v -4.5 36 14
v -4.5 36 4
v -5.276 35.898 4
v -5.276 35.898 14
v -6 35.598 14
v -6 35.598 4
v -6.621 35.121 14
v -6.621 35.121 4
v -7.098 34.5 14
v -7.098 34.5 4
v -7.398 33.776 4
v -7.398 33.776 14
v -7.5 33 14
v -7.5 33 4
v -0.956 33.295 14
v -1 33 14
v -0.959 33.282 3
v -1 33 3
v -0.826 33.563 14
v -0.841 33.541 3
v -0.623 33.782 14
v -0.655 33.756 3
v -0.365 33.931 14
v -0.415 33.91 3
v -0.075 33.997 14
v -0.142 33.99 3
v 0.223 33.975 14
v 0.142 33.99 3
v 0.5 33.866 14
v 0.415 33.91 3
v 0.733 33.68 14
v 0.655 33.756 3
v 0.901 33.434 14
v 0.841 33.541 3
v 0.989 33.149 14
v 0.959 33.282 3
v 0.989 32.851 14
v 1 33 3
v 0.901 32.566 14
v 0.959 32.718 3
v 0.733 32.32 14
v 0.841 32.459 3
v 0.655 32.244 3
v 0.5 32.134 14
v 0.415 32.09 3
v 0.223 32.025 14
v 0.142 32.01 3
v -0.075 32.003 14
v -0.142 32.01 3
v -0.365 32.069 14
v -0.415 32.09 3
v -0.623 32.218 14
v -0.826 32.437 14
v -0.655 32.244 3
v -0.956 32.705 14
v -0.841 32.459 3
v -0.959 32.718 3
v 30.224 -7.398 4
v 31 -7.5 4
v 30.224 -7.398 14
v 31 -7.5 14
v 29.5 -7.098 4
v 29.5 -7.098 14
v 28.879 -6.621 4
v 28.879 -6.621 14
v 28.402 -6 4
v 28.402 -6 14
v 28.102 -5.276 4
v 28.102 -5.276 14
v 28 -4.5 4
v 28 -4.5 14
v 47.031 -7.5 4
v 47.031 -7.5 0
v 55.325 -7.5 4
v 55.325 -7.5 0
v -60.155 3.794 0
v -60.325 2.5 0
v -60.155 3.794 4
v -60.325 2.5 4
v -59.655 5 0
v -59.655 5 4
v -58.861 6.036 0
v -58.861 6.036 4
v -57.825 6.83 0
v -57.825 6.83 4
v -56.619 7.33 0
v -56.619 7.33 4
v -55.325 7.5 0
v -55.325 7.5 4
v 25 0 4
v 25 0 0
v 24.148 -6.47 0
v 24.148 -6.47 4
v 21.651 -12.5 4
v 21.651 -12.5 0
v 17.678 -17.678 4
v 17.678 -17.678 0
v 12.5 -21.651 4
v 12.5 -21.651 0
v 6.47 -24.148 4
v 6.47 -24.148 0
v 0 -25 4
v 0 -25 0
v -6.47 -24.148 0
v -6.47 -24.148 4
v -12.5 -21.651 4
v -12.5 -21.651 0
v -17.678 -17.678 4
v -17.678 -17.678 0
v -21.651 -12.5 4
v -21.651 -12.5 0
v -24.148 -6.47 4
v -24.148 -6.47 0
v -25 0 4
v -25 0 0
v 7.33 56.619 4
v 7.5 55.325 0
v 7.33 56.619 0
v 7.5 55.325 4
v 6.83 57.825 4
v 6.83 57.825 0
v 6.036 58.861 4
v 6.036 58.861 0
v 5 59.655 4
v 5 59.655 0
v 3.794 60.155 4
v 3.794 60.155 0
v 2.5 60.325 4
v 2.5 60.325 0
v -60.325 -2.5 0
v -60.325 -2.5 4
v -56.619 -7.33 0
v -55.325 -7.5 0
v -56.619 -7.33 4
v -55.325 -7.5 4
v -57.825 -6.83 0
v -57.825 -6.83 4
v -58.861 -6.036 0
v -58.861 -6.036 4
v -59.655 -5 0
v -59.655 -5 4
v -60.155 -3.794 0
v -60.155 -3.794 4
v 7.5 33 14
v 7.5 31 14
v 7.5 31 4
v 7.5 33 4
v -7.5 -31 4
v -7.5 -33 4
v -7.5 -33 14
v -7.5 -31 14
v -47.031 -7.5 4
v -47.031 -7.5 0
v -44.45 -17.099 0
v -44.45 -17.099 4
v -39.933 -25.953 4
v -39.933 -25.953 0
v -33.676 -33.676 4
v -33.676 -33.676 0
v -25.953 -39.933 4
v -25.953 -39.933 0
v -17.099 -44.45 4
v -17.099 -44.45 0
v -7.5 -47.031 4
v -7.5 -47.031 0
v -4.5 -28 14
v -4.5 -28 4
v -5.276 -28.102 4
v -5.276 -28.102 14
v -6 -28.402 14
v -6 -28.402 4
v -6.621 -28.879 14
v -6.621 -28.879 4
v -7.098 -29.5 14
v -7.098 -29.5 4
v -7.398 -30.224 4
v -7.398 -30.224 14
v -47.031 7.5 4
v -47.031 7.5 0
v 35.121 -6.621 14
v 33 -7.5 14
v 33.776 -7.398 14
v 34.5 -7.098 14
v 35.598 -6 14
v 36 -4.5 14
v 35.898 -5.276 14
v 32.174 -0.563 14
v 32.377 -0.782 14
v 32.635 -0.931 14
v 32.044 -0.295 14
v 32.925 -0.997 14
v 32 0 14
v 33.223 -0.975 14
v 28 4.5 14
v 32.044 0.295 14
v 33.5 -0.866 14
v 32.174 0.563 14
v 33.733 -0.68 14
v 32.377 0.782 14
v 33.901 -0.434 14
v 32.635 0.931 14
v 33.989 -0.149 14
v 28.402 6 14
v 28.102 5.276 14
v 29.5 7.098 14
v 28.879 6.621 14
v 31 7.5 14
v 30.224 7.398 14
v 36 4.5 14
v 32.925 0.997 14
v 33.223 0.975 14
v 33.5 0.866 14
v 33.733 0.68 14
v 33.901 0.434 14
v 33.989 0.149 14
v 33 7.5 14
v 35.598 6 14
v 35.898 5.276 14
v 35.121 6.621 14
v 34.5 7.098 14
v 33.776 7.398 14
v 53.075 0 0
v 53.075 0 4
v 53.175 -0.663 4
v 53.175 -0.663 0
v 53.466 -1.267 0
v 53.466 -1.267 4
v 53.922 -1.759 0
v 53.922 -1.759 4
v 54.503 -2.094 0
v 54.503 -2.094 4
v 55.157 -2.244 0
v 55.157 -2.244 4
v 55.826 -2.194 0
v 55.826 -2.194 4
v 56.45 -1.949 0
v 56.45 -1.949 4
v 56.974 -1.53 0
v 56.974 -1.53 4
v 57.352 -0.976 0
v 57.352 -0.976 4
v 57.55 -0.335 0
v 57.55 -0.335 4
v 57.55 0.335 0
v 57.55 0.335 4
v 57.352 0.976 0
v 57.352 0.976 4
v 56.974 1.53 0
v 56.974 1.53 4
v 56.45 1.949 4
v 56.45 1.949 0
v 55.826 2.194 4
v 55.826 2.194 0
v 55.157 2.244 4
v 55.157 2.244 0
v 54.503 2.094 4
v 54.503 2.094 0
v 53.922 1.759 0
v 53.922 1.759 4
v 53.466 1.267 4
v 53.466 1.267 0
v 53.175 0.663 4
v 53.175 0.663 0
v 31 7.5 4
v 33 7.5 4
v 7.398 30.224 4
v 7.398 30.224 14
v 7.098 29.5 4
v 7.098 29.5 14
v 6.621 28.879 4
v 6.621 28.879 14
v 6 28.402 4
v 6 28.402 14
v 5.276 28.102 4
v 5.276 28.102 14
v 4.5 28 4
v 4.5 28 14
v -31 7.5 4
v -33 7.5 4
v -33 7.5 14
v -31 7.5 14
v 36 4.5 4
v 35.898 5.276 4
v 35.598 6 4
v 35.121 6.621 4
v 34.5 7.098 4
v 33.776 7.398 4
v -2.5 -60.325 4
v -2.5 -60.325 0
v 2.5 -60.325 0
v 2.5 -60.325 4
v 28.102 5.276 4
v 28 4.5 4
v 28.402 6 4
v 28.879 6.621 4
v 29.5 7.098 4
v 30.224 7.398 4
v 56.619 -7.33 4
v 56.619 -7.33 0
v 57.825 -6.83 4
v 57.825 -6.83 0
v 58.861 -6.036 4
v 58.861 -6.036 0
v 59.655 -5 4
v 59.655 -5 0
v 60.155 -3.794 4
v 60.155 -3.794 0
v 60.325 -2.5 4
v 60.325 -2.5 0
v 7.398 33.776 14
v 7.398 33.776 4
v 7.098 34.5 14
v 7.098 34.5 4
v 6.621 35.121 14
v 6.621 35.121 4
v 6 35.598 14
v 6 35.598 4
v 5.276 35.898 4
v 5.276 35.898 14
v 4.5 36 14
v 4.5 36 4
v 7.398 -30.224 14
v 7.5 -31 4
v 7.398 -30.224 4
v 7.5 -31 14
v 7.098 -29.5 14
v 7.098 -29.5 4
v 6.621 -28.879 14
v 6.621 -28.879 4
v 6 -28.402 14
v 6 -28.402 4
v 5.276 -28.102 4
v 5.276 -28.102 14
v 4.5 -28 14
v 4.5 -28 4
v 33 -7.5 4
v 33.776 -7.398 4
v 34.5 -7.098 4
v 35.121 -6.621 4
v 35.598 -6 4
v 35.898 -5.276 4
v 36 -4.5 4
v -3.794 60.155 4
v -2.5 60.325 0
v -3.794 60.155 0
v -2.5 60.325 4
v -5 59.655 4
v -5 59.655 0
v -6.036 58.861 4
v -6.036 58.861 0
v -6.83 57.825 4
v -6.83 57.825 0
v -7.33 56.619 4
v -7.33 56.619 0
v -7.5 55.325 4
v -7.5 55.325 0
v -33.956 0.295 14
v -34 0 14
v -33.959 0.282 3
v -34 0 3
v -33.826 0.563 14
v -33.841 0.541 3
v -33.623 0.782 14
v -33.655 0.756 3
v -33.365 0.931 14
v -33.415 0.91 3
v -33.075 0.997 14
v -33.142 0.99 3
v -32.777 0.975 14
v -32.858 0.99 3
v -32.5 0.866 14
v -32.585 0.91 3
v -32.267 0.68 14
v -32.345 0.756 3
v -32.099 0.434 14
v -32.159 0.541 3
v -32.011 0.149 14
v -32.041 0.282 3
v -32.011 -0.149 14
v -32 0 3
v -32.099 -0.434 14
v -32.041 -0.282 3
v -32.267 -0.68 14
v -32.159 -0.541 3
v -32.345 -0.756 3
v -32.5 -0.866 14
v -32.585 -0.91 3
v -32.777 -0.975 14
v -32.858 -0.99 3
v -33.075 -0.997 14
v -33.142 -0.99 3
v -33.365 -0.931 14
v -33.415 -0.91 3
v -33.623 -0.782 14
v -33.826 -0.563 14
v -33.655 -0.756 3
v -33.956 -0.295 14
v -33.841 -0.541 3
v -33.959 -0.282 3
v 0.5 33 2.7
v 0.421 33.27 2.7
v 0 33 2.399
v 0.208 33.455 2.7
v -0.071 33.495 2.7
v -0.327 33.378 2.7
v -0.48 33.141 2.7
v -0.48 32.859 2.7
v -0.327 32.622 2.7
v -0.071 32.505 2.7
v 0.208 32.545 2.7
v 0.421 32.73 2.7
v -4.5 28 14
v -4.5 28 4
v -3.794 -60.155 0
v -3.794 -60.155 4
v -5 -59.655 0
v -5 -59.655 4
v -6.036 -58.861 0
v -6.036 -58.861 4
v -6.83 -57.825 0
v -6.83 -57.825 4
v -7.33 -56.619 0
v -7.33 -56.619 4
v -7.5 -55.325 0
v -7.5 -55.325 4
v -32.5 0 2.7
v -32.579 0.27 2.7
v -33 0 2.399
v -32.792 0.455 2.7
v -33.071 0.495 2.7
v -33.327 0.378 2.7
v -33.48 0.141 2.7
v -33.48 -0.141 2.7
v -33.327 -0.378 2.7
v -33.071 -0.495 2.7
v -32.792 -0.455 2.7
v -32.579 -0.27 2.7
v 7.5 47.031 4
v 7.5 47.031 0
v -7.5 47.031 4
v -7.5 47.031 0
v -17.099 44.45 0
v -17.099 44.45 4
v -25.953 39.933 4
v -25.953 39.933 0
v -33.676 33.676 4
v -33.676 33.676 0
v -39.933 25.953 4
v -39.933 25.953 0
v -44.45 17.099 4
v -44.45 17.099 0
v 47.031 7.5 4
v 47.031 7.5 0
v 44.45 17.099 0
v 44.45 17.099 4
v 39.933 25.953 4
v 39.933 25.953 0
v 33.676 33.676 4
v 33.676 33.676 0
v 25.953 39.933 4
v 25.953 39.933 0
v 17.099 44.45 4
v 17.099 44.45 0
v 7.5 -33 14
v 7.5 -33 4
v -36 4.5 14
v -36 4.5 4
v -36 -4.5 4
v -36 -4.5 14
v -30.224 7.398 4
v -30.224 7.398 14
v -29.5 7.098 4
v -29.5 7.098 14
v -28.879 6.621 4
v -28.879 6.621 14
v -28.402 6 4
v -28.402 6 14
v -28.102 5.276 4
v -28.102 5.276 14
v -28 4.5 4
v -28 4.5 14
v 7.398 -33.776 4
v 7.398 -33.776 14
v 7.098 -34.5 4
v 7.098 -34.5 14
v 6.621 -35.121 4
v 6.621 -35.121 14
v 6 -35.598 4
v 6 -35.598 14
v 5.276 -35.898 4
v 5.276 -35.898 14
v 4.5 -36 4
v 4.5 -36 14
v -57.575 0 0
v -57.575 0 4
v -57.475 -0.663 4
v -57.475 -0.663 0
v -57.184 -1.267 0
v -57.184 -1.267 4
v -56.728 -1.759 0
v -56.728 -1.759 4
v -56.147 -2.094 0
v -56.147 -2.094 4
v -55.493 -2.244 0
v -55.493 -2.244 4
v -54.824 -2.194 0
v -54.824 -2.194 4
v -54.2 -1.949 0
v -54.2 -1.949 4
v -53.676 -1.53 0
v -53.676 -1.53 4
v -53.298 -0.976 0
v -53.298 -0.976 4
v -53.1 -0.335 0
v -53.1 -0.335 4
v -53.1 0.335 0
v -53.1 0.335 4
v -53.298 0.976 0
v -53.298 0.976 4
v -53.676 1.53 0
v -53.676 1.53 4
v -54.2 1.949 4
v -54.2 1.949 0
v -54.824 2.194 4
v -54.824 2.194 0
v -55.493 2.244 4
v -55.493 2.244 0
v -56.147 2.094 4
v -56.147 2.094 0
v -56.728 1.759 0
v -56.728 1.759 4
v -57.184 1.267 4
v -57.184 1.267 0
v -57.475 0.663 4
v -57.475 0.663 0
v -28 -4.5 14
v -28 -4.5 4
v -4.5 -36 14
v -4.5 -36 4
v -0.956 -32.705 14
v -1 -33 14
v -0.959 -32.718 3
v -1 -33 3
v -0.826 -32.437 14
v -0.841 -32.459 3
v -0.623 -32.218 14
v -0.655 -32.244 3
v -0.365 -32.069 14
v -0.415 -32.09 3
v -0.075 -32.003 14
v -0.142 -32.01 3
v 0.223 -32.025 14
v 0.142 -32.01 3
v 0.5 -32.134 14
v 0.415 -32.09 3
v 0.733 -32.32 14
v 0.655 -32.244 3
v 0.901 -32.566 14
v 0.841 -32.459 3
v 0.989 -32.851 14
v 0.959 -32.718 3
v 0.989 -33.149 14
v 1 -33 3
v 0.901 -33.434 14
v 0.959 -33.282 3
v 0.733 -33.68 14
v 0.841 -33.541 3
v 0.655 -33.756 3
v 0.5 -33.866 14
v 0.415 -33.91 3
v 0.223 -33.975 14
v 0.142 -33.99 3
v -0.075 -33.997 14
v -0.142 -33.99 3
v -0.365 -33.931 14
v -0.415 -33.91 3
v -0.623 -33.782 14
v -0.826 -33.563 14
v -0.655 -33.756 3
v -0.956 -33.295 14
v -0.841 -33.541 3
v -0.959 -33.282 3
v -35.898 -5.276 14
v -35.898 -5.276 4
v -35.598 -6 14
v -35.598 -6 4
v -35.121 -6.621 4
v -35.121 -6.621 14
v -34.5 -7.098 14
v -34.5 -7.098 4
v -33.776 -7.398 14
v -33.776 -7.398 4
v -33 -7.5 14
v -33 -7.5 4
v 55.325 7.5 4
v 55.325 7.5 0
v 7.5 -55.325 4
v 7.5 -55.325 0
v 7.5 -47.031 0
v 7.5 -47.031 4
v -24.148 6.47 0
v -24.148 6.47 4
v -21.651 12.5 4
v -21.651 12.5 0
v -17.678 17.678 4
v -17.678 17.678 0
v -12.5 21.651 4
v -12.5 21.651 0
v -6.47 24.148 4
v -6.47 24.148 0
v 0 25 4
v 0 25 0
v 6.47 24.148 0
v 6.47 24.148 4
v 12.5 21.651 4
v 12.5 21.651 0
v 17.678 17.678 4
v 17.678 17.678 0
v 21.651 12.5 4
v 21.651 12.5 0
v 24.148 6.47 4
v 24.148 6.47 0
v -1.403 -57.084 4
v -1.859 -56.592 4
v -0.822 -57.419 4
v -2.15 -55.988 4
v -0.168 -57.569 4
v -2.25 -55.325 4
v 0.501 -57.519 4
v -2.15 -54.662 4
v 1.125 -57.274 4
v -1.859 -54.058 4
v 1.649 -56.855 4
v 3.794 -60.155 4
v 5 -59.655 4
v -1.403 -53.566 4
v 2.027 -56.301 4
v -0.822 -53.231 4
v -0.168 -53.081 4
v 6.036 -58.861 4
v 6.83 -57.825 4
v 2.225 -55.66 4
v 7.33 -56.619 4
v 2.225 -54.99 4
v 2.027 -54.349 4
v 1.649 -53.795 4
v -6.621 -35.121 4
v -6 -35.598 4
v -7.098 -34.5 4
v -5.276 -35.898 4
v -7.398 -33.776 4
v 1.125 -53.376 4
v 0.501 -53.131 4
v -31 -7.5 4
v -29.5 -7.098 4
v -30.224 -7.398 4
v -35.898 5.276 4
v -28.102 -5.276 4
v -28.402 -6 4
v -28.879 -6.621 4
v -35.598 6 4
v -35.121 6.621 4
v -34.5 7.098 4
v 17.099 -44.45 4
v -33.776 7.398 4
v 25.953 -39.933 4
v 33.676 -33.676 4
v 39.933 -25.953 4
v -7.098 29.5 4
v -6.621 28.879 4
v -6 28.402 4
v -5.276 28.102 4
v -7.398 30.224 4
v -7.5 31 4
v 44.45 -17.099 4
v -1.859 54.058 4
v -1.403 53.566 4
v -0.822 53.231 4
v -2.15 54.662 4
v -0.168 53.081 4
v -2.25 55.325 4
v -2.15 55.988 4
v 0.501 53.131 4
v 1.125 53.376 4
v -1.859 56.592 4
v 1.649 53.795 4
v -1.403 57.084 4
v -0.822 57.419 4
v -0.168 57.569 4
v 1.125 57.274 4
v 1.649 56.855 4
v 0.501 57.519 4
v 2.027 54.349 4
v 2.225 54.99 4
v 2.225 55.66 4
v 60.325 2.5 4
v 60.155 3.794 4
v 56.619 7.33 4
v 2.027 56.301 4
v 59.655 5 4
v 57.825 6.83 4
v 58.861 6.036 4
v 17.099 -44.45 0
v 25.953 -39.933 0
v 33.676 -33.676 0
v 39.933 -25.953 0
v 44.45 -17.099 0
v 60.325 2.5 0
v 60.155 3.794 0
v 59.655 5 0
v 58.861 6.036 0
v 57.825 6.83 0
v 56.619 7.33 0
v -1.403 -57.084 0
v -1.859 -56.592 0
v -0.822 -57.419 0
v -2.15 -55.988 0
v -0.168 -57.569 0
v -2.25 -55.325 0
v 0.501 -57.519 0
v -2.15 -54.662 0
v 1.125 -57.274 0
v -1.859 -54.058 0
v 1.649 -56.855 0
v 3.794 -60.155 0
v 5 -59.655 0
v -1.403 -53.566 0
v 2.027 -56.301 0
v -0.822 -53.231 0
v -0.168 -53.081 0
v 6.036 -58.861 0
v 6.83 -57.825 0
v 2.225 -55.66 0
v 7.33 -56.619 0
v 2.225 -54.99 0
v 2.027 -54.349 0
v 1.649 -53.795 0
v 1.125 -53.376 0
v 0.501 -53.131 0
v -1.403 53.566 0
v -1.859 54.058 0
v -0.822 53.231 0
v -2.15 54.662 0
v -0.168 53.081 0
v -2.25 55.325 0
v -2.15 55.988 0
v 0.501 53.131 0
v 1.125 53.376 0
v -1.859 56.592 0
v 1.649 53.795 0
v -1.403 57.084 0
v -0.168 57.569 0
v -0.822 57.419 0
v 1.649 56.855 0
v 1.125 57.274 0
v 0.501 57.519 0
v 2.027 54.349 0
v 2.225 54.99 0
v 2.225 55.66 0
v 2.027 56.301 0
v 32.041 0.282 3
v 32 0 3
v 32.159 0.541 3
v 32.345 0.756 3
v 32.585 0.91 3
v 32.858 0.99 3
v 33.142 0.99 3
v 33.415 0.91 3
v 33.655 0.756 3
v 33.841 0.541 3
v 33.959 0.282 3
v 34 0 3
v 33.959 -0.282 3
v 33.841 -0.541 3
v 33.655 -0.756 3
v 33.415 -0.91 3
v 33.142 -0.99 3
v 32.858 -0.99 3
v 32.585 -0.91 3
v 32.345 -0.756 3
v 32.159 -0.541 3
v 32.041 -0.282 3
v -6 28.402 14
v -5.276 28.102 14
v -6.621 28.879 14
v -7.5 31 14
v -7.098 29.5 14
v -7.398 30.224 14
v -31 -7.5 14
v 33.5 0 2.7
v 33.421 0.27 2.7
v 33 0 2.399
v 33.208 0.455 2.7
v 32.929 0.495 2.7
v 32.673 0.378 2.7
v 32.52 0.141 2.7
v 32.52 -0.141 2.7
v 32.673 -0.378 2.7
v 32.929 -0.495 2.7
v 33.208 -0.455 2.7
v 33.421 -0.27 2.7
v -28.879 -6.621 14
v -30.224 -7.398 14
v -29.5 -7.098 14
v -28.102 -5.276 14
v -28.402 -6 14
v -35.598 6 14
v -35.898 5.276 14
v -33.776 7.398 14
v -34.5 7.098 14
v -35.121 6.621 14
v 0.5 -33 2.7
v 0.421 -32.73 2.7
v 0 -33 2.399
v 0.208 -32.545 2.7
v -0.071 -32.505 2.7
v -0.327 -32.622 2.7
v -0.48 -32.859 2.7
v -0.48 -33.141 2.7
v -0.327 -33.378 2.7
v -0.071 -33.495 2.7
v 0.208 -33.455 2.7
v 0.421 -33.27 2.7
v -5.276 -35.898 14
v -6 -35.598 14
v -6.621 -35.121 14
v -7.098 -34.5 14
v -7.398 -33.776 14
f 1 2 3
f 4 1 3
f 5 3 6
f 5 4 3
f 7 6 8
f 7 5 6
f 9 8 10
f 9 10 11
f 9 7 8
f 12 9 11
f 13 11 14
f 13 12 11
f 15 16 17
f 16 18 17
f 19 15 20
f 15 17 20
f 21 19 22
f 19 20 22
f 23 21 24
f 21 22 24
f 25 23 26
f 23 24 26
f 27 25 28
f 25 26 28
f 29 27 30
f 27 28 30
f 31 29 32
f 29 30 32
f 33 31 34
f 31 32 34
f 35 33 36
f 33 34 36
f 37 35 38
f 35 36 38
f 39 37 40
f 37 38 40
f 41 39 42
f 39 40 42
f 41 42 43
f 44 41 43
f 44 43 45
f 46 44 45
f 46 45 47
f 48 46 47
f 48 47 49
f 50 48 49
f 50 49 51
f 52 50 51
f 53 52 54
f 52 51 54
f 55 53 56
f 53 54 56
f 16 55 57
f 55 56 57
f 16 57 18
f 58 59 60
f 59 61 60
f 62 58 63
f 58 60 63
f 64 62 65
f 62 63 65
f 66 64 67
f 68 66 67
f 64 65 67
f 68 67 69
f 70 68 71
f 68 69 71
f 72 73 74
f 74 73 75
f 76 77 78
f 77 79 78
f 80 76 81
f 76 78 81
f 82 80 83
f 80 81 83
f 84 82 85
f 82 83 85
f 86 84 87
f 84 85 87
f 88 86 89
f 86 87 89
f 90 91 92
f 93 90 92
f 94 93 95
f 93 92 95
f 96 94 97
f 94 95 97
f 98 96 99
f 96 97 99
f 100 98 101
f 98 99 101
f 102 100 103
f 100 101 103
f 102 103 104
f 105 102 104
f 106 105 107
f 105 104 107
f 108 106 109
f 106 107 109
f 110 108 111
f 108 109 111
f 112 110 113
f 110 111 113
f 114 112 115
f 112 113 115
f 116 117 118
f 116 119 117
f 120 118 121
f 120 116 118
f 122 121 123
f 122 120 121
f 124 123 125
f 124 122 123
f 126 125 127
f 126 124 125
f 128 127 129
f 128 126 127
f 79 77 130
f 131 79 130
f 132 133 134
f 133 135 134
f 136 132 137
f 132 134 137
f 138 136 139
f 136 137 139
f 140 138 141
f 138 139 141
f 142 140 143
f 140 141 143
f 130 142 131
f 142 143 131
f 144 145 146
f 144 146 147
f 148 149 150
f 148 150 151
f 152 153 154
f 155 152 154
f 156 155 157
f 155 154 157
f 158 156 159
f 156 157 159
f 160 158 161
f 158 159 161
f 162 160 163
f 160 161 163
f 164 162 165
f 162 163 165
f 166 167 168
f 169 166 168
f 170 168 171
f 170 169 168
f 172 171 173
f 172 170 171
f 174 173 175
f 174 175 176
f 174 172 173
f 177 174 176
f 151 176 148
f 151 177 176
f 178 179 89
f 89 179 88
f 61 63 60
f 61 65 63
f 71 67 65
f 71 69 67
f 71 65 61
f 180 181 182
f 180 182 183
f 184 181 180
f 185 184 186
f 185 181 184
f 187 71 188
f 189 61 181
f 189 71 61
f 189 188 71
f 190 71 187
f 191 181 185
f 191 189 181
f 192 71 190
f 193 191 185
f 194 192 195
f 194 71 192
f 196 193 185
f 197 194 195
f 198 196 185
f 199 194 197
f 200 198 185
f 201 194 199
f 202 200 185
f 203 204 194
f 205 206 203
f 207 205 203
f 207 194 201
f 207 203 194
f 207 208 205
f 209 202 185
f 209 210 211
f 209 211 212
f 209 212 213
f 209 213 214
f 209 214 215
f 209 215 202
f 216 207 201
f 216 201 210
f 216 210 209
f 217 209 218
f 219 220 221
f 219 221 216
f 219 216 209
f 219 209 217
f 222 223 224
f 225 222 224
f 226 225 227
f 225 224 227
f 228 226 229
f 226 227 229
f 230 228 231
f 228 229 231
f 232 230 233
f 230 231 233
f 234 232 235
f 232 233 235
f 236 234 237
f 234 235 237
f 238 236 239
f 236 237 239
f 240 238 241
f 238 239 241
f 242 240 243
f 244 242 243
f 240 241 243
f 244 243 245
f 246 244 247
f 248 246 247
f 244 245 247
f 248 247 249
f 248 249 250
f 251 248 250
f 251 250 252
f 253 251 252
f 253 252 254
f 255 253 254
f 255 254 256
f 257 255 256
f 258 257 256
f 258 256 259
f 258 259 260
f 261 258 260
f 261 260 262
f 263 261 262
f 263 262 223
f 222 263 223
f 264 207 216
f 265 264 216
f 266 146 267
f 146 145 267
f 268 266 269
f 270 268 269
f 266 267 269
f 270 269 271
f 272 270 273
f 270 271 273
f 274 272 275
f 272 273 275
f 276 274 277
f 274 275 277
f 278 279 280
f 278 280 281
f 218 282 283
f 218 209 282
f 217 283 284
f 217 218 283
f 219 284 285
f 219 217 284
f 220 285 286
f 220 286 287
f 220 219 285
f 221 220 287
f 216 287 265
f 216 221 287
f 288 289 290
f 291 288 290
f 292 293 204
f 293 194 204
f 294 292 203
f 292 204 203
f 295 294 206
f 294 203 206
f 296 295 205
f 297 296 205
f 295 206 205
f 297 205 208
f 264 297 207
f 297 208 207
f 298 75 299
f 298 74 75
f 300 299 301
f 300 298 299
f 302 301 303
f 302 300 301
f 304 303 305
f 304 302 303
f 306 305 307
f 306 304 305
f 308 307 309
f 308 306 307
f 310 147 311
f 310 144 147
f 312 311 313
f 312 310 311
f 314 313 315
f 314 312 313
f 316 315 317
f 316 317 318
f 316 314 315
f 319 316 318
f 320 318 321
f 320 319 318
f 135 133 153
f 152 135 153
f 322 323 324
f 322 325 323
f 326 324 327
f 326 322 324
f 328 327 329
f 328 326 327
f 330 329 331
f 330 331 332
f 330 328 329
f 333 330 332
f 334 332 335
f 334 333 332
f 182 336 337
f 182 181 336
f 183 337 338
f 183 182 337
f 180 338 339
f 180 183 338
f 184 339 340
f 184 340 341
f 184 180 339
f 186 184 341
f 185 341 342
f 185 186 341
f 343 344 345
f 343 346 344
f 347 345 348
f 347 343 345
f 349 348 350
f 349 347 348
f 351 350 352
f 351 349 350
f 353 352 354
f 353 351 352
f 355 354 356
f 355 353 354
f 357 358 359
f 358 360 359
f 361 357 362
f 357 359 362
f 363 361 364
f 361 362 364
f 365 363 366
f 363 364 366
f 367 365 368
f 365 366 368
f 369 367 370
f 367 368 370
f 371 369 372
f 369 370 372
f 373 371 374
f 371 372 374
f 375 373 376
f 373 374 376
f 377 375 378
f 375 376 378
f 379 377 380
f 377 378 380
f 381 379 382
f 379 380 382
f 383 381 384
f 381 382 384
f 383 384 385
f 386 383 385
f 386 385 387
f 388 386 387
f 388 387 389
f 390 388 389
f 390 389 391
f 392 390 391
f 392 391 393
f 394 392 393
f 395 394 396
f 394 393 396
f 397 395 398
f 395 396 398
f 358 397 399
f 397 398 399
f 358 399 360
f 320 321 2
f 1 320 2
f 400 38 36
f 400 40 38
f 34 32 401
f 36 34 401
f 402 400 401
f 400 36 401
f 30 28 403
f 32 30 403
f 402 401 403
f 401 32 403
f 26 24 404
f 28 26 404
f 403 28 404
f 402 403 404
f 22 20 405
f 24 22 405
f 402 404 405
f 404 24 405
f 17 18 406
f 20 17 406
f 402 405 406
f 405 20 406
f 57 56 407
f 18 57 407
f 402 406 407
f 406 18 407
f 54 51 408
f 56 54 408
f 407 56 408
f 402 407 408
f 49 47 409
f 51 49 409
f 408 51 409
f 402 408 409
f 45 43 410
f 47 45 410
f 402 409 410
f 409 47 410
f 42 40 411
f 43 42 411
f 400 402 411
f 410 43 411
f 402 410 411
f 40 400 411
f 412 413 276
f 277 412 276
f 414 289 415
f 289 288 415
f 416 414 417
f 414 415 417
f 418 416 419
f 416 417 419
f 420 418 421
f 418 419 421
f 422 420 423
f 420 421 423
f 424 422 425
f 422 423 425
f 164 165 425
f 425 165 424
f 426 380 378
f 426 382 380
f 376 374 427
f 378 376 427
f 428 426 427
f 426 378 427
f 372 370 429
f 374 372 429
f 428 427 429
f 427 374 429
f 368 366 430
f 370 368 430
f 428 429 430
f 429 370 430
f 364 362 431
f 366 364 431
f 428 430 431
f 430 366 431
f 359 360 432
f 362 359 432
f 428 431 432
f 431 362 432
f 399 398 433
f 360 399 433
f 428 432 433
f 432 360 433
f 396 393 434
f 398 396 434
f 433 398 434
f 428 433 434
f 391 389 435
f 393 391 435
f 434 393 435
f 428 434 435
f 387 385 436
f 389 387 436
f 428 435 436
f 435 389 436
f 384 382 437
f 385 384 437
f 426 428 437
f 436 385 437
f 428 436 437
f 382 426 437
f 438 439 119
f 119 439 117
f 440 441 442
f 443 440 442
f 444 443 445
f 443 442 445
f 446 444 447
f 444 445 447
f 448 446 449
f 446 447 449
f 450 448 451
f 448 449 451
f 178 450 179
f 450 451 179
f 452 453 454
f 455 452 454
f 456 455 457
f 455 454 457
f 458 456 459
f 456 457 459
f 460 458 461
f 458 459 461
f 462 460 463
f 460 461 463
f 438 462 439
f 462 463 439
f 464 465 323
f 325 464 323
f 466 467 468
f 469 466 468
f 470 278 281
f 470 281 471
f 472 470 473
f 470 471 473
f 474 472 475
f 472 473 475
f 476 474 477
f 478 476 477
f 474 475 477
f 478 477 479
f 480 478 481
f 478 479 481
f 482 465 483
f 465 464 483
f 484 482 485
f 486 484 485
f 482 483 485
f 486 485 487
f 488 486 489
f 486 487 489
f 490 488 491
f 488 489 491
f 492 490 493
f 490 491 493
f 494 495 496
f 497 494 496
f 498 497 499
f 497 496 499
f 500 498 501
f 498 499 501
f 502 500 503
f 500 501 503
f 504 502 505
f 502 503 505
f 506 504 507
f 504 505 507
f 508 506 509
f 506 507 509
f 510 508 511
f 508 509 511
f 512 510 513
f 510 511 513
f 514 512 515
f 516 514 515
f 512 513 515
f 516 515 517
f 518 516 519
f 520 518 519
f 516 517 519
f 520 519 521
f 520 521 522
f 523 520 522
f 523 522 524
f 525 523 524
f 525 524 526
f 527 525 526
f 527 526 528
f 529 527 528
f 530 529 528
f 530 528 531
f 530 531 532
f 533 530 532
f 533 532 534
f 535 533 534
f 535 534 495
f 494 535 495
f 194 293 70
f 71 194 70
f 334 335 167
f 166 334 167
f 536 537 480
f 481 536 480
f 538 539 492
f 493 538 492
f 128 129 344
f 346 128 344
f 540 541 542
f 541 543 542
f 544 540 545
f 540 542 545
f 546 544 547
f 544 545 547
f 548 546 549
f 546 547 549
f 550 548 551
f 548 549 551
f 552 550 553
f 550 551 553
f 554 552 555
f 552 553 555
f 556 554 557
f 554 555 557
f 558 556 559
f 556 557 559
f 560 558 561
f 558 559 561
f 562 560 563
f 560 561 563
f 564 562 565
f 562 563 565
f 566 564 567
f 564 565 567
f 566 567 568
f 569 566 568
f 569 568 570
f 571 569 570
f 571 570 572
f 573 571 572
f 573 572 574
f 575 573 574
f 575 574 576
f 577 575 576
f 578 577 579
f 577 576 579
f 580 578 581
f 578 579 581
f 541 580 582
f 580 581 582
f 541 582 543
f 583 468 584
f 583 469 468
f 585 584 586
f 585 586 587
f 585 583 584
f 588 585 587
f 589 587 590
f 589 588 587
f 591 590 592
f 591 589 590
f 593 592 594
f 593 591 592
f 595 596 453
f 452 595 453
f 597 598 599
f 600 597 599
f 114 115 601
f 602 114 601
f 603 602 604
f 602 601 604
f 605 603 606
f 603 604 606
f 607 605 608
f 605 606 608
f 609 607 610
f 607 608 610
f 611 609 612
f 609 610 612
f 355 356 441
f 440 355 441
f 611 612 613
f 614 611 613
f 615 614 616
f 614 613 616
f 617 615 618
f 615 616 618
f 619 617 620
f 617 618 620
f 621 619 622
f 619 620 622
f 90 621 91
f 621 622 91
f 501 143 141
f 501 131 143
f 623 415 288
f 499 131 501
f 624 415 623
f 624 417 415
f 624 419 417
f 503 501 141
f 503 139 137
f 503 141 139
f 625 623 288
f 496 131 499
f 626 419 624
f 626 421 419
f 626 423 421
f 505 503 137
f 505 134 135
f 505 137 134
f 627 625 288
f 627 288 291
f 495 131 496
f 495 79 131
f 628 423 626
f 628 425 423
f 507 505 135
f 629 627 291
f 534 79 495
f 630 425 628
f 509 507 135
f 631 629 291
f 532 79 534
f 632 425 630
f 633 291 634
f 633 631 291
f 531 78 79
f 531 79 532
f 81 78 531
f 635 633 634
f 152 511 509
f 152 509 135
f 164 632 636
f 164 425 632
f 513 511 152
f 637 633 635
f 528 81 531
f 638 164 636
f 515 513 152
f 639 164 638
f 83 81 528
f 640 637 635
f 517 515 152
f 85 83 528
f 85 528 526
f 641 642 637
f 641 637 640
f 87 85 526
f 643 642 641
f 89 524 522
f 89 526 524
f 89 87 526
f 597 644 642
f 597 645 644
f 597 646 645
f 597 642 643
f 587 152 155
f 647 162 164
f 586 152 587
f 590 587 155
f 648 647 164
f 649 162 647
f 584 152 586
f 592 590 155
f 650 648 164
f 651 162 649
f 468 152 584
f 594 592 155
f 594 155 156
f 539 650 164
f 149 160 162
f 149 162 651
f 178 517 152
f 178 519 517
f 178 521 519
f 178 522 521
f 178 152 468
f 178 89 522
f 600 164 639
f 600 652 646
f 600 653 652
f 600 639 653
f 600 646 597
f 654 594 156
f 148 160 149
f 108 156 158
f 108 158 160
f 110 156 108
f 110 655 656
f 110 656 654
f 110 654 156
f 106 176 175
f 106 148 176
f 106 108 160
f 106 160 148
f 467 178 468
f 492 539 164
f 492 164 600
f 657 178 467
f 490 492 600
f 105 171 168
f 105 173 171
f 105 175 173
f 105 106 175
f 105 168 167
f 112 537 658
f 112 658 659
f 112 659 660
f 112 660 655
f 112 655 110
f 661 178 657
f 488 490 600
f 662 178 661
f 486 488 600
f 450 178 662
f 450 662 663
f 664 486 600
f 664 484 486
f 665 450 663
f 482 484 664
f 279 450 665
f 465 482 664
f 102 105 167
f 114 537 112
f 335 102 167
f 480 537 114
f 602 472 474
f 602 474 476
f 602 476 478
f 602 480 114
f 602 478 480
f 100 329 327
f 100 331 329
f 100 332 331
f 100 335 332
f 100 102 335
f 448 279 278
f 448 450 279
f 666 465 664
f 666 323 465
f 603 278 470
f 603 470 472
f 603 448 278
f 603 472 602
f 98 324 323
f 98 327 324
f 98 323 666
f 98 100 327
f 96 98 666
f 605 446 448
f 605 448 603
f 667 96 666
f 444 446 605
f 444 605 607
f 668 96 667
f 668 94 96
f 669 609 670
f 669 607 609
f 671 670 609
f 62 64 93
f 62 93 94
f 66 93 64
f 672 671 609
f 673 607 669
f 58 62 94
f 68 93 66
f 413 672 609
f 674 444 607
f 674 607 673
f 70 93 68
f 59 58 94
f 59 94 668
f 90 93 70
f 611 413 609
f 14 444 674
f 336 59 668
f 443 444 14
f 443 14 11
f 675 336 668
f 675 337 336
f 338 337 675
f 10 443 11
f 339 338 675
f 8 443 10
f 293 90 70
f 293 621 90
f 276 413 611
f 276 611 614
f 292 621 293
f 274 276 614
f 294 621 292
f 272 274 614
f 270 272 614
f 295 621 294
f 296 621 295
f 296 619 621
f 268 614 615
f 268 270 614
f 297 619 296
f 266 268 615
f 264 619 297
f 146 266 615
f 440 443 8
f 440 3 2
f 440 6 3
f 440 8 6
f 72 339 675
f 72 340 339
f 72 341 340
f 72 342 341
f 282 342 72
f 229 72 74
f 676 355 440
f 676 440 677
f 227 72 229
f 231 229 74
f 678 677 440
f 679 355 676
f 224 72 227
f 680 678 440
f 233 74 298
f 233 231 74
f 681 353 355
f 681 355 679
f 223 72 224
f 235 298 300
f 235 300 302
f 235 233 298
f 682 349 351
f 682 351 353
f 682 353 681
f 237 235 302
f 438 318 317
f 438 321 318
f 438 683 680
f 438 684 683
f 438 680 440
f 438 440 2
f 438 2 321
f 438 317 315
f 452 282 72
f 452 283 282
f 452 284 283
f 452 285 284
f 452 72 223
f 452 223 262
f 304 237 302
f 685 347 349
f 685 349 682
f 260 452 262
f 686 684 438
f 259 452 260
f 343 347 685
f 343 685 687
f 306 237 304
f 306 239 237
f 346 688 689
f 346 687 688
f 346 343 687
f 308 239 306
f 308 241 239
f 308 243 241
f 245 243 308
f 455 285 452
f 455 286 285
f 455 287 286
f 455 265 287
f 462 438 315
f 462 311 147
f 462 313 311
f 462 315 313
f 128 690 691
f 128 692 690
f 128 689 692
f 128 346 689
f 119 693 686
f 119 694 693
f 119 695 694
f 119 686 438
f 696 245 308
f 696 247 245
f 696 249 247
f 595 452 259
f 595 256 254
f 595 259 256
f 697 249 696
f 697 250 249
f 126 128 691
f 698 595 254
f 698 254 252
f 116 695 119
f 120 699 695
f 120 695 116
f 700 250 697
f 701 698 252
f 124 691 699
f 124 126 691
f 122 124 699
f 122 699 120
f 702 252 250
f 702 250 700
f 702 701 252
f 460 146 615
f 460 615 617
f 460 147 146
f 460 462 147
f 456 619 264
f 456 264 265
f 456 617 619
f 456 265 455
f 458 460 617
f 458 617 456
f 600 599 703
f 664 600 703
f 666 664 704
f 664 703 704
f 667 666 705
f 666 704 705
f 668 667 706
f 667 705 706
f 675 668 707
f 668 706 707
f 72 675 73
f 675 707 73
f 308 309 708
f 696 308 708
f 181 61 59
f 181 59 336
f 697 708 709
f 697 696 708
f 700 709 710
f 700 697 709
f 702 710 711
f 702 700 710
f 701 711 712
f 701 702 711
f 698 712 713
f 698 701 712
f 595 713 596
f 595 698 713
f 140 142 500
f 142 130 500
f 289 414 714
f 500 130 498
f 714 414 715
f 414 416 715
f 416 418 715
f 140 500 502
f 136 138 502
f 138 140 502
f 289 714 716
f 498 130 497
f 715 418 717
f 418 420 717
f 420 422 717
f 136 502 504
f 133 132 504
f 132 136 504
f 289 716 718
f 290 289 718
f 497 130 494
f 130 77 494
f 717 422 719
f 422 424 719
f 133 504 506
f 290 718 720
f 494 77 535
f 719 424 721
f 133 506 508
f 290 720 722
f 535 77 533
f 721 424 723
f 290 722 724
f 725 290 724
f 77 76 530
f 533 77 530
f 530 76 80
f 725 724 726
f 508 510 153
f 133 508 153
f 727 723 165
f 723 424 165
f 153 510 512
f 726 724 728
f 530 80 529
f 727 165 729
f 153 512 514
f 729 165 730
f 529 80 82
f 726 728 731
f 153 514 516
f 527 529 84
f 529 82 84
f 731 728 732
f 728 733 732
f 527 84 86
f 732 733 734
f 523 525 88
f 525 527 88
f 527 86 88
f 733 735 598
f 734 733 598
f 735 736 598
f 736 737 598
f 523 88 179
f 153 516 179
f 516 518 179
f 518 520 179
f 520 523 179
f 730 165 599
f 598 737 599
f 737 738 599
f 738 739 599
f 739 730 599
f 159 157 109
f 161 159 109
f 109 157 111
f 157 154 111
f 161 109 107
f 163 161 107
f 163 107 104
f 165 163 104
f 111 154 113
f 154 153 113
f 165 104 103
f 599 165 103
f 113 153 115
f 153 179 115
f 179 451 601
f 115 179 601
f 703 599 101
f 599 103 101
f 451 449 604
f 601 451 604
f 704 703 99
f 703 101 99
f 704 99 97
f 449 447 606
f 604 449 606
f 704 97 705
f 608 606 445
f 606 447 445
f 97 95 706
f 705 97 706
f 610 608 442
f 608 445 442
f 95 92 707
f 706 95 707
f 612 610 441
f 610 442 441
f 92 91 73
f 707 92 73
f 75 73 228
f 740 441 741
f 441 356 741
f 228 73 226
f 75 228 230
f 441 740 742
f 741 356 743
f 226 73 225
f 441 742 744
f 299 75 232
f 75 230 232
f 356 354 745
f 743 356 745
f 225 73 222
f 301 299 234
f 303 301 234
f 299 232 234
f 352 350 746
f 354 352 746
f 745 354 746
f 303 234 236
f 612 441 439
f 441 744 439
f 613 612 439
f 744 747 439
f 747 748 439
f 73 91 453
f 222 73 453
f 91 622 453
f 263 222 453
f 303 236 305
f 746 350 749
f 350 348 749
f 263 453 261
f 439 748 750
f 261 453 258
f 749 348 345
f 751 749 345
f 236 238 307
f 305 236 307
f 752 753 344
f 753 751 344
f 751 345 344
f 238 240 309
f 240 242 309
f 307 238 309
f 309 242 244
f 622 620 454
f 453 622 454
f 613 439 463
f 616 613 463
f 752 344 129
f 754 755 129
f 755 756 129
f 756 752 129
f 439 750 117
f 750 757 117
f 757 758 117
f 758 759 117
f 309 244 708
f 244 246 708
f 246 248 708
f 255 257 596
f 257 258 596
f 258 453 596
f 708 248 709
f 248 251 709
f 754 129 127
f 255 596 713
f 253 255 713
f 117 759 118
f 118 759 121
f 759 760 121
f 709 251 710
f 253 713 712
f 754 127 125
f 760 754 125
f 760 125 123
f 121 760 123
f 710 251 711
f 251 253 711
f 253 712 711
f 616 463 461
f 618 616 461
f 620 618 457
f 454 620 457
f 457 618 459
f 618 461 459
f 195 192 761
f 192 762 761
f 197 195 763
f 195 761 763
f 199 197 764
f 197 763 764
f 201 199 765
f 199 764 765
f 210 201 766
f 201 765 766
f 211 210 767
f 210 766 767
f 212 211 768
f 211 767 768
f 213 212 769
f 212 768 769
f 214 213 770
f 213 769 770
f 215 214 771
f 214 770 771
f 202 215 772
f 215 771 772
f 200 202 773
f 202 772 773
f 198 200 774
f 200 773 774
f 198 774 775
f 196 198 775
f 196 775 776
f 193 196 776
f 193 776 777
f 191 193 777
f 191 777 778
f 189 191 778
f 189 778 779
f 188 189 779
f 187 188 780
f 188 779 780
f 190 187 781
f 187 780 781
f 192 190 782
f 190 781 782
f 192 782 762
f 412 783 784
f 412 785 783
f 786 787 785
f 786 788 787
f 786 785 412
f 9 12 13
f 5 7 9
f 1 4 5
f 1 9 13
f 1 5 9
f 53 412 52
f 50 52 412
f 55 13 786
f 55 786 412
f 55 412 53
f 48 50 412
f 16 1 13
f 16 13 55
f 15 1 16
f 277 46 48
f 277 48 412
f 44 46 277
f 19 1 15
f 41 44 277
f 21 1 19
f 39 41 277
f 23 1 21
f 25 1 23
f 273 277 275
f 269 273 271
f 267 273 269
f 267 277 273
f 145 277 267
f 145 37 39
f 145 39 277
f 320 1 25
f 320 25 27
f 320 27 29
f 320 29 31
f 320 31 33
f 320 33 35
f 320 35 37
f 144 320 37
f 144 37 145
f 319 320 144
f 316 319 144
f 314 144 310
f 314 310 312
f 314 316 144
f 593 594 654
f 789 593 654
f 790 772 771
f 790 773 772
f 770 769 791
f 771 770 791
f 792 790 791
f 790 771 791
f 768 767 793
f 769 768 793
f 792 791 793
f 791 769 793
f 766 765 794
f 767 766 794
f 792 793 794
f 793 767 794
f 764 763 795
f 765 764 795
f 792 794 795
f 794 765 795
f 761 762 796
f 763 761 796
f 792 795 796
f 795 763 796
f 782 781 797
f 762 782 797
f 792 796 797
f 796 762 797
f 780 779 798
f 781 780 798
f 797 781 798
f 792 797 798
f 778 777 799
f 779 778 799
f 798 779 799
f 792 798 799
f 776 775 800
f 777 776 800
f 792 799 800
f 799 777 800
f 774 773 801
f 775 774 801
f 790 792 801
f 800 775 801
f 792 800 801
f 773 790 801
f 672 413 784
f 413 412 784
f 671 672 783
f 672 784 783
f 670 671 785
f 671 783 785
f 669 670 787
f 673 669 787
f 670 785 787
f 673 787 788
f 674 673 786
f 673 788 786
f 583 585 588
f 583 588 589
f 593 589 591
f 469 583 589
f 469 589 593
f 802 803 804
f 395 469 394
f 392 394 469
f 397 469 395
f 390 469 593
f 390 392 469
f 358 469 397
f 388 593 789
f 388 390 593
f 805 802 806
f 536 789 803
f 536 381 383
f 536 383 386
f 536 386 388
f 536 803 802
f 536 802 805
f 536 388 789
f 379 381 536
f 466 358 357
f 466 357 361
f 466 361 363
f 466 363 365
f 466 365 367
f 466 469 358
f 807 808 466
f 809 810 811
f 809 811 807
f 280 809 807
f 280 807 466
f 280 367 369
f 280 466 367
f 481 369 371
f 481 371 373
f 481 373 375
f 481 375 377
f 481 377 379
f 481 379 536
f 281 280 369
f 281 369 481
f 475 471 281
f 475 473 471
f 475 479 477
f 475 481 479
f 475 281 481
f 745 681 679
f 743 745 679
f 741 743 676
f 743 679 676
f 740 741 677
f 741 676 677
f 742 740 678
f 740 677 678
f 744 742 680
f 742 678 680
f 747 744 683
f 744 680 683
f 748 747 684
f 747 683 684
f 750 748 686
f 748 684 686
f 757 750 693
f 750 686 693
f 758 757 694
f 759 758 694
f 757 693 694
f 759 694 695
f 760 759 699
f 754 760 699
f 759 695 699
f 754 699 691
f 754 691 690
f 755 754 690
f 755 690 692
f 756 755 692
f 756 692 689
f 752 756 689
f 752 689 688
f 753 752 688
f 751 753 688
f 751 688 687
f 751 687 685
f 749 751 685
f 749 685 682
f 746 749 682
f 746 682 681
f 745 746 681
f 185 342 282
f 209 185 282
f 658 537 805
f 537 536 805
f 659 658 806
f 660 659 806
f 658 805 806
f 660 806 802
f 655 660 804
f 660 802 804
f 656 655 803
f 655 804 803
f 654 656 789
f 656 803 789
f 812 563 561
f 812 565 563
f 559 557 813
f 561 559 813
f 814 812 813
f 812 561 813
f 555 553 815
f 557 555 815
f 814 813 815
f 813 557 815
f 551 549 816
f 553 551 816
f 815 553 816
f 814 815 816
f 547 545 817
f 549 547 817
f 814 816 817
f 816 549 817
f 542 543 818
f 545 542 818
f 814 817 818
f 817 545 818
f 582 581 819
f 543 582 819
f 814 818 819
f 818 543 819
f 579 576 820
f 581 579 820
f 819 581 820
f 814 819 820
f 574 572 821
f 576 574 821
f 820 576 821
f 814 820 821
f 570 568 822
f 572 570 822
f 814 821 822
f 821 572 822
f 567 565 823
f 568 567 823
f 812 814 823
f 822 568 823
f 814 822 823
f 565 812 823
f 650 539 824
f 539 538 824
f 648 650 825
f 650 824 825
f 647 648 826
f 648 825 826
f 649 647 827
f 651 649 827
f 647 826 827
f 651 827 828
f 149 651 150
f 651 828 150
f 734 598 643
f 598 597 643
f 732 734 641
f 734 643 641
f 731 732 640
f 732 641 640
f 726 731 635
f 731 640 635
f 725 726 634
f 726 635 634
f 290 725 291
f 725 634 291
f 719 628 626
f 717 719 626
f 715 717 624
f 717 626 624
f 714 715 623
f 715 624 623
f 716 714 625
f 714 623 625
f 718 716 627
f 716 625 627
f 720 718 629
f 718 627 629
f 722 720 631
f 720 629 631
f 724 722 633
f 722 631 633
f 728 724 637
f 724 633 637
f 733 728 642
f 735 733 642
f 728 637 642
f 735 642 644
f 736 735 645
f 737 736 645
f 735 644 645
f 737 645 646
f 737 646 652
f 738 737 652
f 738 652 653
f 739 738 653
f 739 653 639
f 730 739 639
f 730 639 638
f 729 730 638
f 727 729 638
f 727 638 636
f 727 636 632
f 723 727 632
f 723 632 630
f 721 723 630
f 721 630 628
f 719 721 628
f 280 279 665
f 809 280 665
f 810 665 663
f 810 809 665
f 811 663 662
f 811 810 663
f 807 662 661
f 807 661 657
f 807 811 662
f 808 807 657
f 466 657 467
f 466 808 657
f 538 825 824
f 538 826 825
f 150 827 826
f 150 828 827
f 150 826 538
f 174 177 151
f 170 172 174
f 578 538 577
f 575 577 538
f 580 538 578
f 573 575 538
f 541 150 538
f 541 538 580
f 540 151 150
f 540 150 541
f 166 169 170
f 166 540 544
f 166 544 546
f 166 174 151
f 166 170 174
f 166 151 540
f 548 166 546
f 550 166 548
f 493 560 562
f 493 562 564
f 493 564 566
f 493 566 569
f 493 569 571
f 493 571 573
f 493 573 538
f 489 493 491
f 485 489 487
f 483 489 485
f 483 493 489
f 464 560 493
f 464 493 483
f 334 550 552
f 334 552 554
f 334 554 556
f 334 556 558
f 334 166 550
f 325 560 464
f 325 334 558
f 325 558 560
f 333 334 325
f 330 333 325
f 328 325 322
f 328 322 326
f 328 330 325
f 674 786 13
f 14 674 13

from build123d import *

# Parameters (mm, degrees)
F1_DEPTH = 4
F0_W     = 7.5
F0_H     = 8
F0_W_2   = 8
F0_H_2   = 7.5
F2_DEPTH = 14
F4_D     = 2
F4_DEPTH = 11
F4_TIP   = 0.600860619
F5_D     = 4.5
F5_DEPTH = 11
F5_TIP   = 1.3519363928
F6_R     = 5
F7_R     = 3


with BuildPart() as f1:
    # F0 (on Top) → F1 (new body)
    with BuildSketch(Plane.XY):
        with BuildLine():
            Line((28, 0), (25, 0))
            ThreePointArc((25, 0), (17.6776695297, -17.6776695297), (0, -25))
            Line((0, -25), (0, -28))
            Line((0, -28), (7.5, -28))
            Line((7.5, -28), (7.5, -36))
            Line((7.5, -36), (7.5, -47.0307412763))
            ThreePointArc((7.5, -47.0307412763), (33.675960454, -33.675960454), (47.0307412763, -7.5))
            Line((47.0307412763, -7.5), (36, -7.5))
            Line((36, -7.5), (28, -7.5))
            Line((28, -7.5), (28, 0))
        make_face()
        with BuildLine():
            ThreePointArc((0, 25), (17.6776695297, 17.6776695297), (25, 0))
            Line((25, 0), (28, 0))
            Line((28, 0), (28, 7.5))
            Line((28, 7.5), (36, 7.5))
            Line((36, 7.5), (47.0307412763, 7.5))
            ThreePointArc((47.0307412763, 7.5), (33.675960454, 33.675960454), (7.5, 47.0307412763))
            Line((7.5, 47.0307412763), (7.5, 36))
            Line((7.5, 36), (7.5, 28))
            Line((7.5, 28), (0, 28))
            Line((0, 28), (0, 25))
        make_face()
        with BuildLine():
            ThreePointArc((-25, 0), (-17.6776695297, 17.6776695297), (0, 25))
            Line((0, 25), (0, 28))
            Line((0, 28), (-7.5, 28))
            Line((-7.5, 28), (-7.5, 36))
            Line((-7.5, 36), (-7.5, 47.0307412763))
            ThreePointArc((-7.5, 47.0307412763), (-33.675960454, 33.675960454), (-47.0307412763, 7.5))
            Line((-47.0307412763, 7.5), (-36, 7.5))
            Line((-36, 7.5), (-28, 7.5))
            Line((-28, 7.5), (-28, 0))
            Line((-28, 0), (-25, 0))
        make_face()
        with BuildLine():
            Line((0, -28), (0, -25))
            ThreePointArc((0, -25), (-17.6776695297, -17.6776695297), (-25, 0))
            Line((-25, 0), (-28, 0))
            Line((-28, 0), (-28, -7.5))
            Line((-28, -7.5), (-36, -7.5))
            Line((-36, -7.5), (-47.0307412763, -7.5))
            ThreePointArc((-47.0307412763, -7.5), (-33.675960454, -33.675960454), (-7.5, -47.0307412763))
            Line((-7.5, -47.0307412763), (-7.5, -36))
            Line((-7.5, -36), (-7.5, -28))
            Line((-7.5, -28), (0, -28))
        make_face()
        with BuildLine():
            Line((36, 7.5), (36, 0))
            Line((36, 0), (47.625, 0))
            ThreePointArc((47.625, 0), (47.476202872, 3.7617530299), (47.0307412763, 7.5))
            Line((47.0307412763, 7.5), (36, 7.5))
        make_face()
        with BuildLine():
            Line((47.625, 0), (36, 0))
            Line((36, 0), (36, -7.5))
            Line((36, -7.5), (47.0307412763, -7.5))
            ThreePointArc((47.0307412763, -7.5), (47.476202872, -3.7617530299), (47.625, 0))
        make_face()
        with BuildLine():
            Line((-7.5, 36), (0, 36))
            Line((0, 36), (0, 47.625))
            ThreePointArc((0, 47.625), (-3.7617530299, 47.476202872), (-7.5, 47.0307412763))
            Line((-7.5, 47.0307412763), (-7.5, 36))
        make_face()
        with BuildLine():
            Line((0, 47.625), (0, 36))
            Line((0, 36), (7.5, 36))
            Line((7.5, 36), (7.5, 47.0307412763))
            ThreePointArc((7.5, 47.0307412763), (3.7617530299, 47.476202872), (0, 47.625))
        make_face()
        with BuildLine():
            Line((7.5, -36), (0, -36))
            Line((0, -36), (0, -47.625))
            ThreePointArc((0, -47.625), (3.7617530299, -47.476202872), (7.5, -47.0307412763))
            Line((7.5, -47.0307412763), (7.5, -36))
        make_face()
        with BuildLine():
            Line((0, -47.625), (0, -36))
            Line((0, -36), (-7.5, -36))
            Line((-7.5, -36), (-7.5, -47.0307412763))
            ThreePointArc((-7.5, -47.0307412763), (-3.7617530299, -47.476202872), (0, -47.625))
        make_face()
        with BuildLine():
            ThreePointArc((47.0307412763, 7.5), (47.476202872, 3.7617530299), (47.625, 0))
            ThreePointArc((47.625, 0), (47.476202872, -3.7617530299), (47.0307412763, -7.5))
            Line((47.0307412763, -7.5), (60.325, -7.5))
            Line((60.325, -7.5), (60.325, 7.5))
            Line((60.325, 7.5), (47.0307412763, 7.5))
        make_face()
        with BuildLine():
            Line((-36, -7.5), (-36, 0))
            Line((-36, 0), (-47.625, 0))
            ThreePointArc((-47.625, 0), (-47.476202872, -3.7617530299), (-47.0307412763, -7.5))
            Line((-47.0307412763, -7.5), (-36, -7.5))
        make_face()
        with BuildLine():
            Line((-47.625, 0), (-36, 0))
            Line((-36, 0), (-36, 7.5))
            Line((-36, 7.5), (-47.0307412763, 7.5))
            ThreePointArc((-47.0307412763, 7.5), (-47.476202872, 3.7617530299), (-47.625, 0))
        make_face()
        with BuildLine():
            ThreePointArc((-7.5, 47.0307412763), (-3.7617530299, 47.476202872), (0, 47.625))
            ThreePointArc((0, 47.625), (3.7617530299, 47.476202872), (7.5, 47.0307412763))
            Line((7.5, 47.0307412763), (7.5, 60.325))
            Line((7.5, 60.325), (-7.5, 60.325))
            Line((-7.5, 60.325), (-7.5, 47.0307412763))
        make_face()
        with BuildLine():
            ThreePointArc((7.5, -47.0307412763), (3.7617530299, -47.476202872), (0, -47.625))
            ThreePointArc((0, -47.625), (-3.7617530299, -47.476202872), (-7.5, -47.0307412763))
            Line((-7.5, -47.0307412763), (-7.5, -60.325))
            Line((-7.5, -60.325), (7.5, -60.325))
            Line((7.5, -60.325), (7.5, -47.0307412763))
        make_face()
        with BuildLine():
            ThreePointArc((-47.0307412763, -7.5), (-47.476202872, -3.7617530299), (-47.625, 0))
            ThreePointArc((-47.625, 0), (-47.476202872, 3.7617530299), (-47.0307412763, 7.5))
            Line((-47.0307412763, 7.5), (-60.325, 7.5))
            Line((-60.325, 7.5), (-60.325, -7.5))
            Line((-60.325, -7.5), (-47.0307412763, -7.5))
        make_face()
    extrude(amount=F1_DEPTH)

    # F0 (on Top) → F2 (join)
    with BuildSketch(Plane.XY):
        with Locations((3.75, 32)):
            Rectangle(F0_W, F0_H)
        with Locations((-3.75, 32)):
            Rectangle(F0_W, F0_H)
        with Locations((32, 3.75)):
            Rectangle(F0_W_2, F0_H_2)
        with Locations((32, -3.75)):
            Rectangle(F0_W_2, F0_H_2)
        with Locations((3.75, -32)):
            Rectangle(F0_W, F0_H)
        with Locations((-3.75, -32)):
            Rectangle(F0_W, F0_H)
        with Locations((-32, -3.75)):
            Rectangle(F0_W_2, F0_H_2)
        with Locations((-32, 3.75)):
            Rectangle(F0_W_2, F0_H_2)
    extrude(amount=F2_DEPTH)

    # F4
    with Locations(Plane.XY.offset(14)):
        with Locations((0, 33), (33, 0), (0, -33), (-33, 0)):
            Hole(F4_D / 2, depth=F4_DEPTH)
            with Locations((0, 0, -(F4_DEPTH + F4_TIP / 2))):  # 118° drill point
                Cone(0, F4_D / 2, F4_TIP, mode=Mode.SUBTRACT)

    # F5
    with Locations(Plane(origin=(0, 0, 0), x_dir=(1, 0, 0), z_dir=(0, 0, -1))):
        with Locations((0, -55.325), (55.325, 0), (0, 55.325), (-55.325, 0)):
            Hole(F5_D / 2, depth=F5_DEPTH)
            with Locations((0, 0, -(F5_DEPTH + F5_TIP / 2))):  # 118° drill point
                Cone(0, F5_D / 2, F5_TIP, mode=Mode.SUBTRACT)

    # F6
    f6_edges = [f1.edges().sort_by_distance(p)[0] for p in [
        (7.5, 60.325, 2),
        (-7.5, 60.325, 2),
        (-60.325, 7.5, 2),
        (-60.325, -7.5, 2),
        (7.5, -60.325, 2),
        (-7.5, -60.325, 2),
        (60.325, -7.5, 2),
        (60.325, 7.5, 2),
    ]]
    fillet(f6_edges, radius=F6_R)

    # F7
    f7_edges = [f1.edges().sort_by_distance(p)[0] for p in [
        (7.5, 28, 9),
        (7.5, 36, 9),
        (-7.5, 28, 9),
        (-7.5, 36, 9),
        (-36, -7.5, 9),
        (-28, -7.5, 9),
        (-36, 7.5, 9),
        (-28, 7.5, 9),
        (-7.5, -28, 9),
        (7.5, -28, 9),
        (36, 7.5, 9),
        (28, 7.5, 9),
        (36, -7.5, 9),
        (28, -7.5, 9),
        (7.5, -36, 9),
        (-7.5, -36, 9),
    ]]
    fillet(f7_edges, radius=F7_R)


solid = f1.part
